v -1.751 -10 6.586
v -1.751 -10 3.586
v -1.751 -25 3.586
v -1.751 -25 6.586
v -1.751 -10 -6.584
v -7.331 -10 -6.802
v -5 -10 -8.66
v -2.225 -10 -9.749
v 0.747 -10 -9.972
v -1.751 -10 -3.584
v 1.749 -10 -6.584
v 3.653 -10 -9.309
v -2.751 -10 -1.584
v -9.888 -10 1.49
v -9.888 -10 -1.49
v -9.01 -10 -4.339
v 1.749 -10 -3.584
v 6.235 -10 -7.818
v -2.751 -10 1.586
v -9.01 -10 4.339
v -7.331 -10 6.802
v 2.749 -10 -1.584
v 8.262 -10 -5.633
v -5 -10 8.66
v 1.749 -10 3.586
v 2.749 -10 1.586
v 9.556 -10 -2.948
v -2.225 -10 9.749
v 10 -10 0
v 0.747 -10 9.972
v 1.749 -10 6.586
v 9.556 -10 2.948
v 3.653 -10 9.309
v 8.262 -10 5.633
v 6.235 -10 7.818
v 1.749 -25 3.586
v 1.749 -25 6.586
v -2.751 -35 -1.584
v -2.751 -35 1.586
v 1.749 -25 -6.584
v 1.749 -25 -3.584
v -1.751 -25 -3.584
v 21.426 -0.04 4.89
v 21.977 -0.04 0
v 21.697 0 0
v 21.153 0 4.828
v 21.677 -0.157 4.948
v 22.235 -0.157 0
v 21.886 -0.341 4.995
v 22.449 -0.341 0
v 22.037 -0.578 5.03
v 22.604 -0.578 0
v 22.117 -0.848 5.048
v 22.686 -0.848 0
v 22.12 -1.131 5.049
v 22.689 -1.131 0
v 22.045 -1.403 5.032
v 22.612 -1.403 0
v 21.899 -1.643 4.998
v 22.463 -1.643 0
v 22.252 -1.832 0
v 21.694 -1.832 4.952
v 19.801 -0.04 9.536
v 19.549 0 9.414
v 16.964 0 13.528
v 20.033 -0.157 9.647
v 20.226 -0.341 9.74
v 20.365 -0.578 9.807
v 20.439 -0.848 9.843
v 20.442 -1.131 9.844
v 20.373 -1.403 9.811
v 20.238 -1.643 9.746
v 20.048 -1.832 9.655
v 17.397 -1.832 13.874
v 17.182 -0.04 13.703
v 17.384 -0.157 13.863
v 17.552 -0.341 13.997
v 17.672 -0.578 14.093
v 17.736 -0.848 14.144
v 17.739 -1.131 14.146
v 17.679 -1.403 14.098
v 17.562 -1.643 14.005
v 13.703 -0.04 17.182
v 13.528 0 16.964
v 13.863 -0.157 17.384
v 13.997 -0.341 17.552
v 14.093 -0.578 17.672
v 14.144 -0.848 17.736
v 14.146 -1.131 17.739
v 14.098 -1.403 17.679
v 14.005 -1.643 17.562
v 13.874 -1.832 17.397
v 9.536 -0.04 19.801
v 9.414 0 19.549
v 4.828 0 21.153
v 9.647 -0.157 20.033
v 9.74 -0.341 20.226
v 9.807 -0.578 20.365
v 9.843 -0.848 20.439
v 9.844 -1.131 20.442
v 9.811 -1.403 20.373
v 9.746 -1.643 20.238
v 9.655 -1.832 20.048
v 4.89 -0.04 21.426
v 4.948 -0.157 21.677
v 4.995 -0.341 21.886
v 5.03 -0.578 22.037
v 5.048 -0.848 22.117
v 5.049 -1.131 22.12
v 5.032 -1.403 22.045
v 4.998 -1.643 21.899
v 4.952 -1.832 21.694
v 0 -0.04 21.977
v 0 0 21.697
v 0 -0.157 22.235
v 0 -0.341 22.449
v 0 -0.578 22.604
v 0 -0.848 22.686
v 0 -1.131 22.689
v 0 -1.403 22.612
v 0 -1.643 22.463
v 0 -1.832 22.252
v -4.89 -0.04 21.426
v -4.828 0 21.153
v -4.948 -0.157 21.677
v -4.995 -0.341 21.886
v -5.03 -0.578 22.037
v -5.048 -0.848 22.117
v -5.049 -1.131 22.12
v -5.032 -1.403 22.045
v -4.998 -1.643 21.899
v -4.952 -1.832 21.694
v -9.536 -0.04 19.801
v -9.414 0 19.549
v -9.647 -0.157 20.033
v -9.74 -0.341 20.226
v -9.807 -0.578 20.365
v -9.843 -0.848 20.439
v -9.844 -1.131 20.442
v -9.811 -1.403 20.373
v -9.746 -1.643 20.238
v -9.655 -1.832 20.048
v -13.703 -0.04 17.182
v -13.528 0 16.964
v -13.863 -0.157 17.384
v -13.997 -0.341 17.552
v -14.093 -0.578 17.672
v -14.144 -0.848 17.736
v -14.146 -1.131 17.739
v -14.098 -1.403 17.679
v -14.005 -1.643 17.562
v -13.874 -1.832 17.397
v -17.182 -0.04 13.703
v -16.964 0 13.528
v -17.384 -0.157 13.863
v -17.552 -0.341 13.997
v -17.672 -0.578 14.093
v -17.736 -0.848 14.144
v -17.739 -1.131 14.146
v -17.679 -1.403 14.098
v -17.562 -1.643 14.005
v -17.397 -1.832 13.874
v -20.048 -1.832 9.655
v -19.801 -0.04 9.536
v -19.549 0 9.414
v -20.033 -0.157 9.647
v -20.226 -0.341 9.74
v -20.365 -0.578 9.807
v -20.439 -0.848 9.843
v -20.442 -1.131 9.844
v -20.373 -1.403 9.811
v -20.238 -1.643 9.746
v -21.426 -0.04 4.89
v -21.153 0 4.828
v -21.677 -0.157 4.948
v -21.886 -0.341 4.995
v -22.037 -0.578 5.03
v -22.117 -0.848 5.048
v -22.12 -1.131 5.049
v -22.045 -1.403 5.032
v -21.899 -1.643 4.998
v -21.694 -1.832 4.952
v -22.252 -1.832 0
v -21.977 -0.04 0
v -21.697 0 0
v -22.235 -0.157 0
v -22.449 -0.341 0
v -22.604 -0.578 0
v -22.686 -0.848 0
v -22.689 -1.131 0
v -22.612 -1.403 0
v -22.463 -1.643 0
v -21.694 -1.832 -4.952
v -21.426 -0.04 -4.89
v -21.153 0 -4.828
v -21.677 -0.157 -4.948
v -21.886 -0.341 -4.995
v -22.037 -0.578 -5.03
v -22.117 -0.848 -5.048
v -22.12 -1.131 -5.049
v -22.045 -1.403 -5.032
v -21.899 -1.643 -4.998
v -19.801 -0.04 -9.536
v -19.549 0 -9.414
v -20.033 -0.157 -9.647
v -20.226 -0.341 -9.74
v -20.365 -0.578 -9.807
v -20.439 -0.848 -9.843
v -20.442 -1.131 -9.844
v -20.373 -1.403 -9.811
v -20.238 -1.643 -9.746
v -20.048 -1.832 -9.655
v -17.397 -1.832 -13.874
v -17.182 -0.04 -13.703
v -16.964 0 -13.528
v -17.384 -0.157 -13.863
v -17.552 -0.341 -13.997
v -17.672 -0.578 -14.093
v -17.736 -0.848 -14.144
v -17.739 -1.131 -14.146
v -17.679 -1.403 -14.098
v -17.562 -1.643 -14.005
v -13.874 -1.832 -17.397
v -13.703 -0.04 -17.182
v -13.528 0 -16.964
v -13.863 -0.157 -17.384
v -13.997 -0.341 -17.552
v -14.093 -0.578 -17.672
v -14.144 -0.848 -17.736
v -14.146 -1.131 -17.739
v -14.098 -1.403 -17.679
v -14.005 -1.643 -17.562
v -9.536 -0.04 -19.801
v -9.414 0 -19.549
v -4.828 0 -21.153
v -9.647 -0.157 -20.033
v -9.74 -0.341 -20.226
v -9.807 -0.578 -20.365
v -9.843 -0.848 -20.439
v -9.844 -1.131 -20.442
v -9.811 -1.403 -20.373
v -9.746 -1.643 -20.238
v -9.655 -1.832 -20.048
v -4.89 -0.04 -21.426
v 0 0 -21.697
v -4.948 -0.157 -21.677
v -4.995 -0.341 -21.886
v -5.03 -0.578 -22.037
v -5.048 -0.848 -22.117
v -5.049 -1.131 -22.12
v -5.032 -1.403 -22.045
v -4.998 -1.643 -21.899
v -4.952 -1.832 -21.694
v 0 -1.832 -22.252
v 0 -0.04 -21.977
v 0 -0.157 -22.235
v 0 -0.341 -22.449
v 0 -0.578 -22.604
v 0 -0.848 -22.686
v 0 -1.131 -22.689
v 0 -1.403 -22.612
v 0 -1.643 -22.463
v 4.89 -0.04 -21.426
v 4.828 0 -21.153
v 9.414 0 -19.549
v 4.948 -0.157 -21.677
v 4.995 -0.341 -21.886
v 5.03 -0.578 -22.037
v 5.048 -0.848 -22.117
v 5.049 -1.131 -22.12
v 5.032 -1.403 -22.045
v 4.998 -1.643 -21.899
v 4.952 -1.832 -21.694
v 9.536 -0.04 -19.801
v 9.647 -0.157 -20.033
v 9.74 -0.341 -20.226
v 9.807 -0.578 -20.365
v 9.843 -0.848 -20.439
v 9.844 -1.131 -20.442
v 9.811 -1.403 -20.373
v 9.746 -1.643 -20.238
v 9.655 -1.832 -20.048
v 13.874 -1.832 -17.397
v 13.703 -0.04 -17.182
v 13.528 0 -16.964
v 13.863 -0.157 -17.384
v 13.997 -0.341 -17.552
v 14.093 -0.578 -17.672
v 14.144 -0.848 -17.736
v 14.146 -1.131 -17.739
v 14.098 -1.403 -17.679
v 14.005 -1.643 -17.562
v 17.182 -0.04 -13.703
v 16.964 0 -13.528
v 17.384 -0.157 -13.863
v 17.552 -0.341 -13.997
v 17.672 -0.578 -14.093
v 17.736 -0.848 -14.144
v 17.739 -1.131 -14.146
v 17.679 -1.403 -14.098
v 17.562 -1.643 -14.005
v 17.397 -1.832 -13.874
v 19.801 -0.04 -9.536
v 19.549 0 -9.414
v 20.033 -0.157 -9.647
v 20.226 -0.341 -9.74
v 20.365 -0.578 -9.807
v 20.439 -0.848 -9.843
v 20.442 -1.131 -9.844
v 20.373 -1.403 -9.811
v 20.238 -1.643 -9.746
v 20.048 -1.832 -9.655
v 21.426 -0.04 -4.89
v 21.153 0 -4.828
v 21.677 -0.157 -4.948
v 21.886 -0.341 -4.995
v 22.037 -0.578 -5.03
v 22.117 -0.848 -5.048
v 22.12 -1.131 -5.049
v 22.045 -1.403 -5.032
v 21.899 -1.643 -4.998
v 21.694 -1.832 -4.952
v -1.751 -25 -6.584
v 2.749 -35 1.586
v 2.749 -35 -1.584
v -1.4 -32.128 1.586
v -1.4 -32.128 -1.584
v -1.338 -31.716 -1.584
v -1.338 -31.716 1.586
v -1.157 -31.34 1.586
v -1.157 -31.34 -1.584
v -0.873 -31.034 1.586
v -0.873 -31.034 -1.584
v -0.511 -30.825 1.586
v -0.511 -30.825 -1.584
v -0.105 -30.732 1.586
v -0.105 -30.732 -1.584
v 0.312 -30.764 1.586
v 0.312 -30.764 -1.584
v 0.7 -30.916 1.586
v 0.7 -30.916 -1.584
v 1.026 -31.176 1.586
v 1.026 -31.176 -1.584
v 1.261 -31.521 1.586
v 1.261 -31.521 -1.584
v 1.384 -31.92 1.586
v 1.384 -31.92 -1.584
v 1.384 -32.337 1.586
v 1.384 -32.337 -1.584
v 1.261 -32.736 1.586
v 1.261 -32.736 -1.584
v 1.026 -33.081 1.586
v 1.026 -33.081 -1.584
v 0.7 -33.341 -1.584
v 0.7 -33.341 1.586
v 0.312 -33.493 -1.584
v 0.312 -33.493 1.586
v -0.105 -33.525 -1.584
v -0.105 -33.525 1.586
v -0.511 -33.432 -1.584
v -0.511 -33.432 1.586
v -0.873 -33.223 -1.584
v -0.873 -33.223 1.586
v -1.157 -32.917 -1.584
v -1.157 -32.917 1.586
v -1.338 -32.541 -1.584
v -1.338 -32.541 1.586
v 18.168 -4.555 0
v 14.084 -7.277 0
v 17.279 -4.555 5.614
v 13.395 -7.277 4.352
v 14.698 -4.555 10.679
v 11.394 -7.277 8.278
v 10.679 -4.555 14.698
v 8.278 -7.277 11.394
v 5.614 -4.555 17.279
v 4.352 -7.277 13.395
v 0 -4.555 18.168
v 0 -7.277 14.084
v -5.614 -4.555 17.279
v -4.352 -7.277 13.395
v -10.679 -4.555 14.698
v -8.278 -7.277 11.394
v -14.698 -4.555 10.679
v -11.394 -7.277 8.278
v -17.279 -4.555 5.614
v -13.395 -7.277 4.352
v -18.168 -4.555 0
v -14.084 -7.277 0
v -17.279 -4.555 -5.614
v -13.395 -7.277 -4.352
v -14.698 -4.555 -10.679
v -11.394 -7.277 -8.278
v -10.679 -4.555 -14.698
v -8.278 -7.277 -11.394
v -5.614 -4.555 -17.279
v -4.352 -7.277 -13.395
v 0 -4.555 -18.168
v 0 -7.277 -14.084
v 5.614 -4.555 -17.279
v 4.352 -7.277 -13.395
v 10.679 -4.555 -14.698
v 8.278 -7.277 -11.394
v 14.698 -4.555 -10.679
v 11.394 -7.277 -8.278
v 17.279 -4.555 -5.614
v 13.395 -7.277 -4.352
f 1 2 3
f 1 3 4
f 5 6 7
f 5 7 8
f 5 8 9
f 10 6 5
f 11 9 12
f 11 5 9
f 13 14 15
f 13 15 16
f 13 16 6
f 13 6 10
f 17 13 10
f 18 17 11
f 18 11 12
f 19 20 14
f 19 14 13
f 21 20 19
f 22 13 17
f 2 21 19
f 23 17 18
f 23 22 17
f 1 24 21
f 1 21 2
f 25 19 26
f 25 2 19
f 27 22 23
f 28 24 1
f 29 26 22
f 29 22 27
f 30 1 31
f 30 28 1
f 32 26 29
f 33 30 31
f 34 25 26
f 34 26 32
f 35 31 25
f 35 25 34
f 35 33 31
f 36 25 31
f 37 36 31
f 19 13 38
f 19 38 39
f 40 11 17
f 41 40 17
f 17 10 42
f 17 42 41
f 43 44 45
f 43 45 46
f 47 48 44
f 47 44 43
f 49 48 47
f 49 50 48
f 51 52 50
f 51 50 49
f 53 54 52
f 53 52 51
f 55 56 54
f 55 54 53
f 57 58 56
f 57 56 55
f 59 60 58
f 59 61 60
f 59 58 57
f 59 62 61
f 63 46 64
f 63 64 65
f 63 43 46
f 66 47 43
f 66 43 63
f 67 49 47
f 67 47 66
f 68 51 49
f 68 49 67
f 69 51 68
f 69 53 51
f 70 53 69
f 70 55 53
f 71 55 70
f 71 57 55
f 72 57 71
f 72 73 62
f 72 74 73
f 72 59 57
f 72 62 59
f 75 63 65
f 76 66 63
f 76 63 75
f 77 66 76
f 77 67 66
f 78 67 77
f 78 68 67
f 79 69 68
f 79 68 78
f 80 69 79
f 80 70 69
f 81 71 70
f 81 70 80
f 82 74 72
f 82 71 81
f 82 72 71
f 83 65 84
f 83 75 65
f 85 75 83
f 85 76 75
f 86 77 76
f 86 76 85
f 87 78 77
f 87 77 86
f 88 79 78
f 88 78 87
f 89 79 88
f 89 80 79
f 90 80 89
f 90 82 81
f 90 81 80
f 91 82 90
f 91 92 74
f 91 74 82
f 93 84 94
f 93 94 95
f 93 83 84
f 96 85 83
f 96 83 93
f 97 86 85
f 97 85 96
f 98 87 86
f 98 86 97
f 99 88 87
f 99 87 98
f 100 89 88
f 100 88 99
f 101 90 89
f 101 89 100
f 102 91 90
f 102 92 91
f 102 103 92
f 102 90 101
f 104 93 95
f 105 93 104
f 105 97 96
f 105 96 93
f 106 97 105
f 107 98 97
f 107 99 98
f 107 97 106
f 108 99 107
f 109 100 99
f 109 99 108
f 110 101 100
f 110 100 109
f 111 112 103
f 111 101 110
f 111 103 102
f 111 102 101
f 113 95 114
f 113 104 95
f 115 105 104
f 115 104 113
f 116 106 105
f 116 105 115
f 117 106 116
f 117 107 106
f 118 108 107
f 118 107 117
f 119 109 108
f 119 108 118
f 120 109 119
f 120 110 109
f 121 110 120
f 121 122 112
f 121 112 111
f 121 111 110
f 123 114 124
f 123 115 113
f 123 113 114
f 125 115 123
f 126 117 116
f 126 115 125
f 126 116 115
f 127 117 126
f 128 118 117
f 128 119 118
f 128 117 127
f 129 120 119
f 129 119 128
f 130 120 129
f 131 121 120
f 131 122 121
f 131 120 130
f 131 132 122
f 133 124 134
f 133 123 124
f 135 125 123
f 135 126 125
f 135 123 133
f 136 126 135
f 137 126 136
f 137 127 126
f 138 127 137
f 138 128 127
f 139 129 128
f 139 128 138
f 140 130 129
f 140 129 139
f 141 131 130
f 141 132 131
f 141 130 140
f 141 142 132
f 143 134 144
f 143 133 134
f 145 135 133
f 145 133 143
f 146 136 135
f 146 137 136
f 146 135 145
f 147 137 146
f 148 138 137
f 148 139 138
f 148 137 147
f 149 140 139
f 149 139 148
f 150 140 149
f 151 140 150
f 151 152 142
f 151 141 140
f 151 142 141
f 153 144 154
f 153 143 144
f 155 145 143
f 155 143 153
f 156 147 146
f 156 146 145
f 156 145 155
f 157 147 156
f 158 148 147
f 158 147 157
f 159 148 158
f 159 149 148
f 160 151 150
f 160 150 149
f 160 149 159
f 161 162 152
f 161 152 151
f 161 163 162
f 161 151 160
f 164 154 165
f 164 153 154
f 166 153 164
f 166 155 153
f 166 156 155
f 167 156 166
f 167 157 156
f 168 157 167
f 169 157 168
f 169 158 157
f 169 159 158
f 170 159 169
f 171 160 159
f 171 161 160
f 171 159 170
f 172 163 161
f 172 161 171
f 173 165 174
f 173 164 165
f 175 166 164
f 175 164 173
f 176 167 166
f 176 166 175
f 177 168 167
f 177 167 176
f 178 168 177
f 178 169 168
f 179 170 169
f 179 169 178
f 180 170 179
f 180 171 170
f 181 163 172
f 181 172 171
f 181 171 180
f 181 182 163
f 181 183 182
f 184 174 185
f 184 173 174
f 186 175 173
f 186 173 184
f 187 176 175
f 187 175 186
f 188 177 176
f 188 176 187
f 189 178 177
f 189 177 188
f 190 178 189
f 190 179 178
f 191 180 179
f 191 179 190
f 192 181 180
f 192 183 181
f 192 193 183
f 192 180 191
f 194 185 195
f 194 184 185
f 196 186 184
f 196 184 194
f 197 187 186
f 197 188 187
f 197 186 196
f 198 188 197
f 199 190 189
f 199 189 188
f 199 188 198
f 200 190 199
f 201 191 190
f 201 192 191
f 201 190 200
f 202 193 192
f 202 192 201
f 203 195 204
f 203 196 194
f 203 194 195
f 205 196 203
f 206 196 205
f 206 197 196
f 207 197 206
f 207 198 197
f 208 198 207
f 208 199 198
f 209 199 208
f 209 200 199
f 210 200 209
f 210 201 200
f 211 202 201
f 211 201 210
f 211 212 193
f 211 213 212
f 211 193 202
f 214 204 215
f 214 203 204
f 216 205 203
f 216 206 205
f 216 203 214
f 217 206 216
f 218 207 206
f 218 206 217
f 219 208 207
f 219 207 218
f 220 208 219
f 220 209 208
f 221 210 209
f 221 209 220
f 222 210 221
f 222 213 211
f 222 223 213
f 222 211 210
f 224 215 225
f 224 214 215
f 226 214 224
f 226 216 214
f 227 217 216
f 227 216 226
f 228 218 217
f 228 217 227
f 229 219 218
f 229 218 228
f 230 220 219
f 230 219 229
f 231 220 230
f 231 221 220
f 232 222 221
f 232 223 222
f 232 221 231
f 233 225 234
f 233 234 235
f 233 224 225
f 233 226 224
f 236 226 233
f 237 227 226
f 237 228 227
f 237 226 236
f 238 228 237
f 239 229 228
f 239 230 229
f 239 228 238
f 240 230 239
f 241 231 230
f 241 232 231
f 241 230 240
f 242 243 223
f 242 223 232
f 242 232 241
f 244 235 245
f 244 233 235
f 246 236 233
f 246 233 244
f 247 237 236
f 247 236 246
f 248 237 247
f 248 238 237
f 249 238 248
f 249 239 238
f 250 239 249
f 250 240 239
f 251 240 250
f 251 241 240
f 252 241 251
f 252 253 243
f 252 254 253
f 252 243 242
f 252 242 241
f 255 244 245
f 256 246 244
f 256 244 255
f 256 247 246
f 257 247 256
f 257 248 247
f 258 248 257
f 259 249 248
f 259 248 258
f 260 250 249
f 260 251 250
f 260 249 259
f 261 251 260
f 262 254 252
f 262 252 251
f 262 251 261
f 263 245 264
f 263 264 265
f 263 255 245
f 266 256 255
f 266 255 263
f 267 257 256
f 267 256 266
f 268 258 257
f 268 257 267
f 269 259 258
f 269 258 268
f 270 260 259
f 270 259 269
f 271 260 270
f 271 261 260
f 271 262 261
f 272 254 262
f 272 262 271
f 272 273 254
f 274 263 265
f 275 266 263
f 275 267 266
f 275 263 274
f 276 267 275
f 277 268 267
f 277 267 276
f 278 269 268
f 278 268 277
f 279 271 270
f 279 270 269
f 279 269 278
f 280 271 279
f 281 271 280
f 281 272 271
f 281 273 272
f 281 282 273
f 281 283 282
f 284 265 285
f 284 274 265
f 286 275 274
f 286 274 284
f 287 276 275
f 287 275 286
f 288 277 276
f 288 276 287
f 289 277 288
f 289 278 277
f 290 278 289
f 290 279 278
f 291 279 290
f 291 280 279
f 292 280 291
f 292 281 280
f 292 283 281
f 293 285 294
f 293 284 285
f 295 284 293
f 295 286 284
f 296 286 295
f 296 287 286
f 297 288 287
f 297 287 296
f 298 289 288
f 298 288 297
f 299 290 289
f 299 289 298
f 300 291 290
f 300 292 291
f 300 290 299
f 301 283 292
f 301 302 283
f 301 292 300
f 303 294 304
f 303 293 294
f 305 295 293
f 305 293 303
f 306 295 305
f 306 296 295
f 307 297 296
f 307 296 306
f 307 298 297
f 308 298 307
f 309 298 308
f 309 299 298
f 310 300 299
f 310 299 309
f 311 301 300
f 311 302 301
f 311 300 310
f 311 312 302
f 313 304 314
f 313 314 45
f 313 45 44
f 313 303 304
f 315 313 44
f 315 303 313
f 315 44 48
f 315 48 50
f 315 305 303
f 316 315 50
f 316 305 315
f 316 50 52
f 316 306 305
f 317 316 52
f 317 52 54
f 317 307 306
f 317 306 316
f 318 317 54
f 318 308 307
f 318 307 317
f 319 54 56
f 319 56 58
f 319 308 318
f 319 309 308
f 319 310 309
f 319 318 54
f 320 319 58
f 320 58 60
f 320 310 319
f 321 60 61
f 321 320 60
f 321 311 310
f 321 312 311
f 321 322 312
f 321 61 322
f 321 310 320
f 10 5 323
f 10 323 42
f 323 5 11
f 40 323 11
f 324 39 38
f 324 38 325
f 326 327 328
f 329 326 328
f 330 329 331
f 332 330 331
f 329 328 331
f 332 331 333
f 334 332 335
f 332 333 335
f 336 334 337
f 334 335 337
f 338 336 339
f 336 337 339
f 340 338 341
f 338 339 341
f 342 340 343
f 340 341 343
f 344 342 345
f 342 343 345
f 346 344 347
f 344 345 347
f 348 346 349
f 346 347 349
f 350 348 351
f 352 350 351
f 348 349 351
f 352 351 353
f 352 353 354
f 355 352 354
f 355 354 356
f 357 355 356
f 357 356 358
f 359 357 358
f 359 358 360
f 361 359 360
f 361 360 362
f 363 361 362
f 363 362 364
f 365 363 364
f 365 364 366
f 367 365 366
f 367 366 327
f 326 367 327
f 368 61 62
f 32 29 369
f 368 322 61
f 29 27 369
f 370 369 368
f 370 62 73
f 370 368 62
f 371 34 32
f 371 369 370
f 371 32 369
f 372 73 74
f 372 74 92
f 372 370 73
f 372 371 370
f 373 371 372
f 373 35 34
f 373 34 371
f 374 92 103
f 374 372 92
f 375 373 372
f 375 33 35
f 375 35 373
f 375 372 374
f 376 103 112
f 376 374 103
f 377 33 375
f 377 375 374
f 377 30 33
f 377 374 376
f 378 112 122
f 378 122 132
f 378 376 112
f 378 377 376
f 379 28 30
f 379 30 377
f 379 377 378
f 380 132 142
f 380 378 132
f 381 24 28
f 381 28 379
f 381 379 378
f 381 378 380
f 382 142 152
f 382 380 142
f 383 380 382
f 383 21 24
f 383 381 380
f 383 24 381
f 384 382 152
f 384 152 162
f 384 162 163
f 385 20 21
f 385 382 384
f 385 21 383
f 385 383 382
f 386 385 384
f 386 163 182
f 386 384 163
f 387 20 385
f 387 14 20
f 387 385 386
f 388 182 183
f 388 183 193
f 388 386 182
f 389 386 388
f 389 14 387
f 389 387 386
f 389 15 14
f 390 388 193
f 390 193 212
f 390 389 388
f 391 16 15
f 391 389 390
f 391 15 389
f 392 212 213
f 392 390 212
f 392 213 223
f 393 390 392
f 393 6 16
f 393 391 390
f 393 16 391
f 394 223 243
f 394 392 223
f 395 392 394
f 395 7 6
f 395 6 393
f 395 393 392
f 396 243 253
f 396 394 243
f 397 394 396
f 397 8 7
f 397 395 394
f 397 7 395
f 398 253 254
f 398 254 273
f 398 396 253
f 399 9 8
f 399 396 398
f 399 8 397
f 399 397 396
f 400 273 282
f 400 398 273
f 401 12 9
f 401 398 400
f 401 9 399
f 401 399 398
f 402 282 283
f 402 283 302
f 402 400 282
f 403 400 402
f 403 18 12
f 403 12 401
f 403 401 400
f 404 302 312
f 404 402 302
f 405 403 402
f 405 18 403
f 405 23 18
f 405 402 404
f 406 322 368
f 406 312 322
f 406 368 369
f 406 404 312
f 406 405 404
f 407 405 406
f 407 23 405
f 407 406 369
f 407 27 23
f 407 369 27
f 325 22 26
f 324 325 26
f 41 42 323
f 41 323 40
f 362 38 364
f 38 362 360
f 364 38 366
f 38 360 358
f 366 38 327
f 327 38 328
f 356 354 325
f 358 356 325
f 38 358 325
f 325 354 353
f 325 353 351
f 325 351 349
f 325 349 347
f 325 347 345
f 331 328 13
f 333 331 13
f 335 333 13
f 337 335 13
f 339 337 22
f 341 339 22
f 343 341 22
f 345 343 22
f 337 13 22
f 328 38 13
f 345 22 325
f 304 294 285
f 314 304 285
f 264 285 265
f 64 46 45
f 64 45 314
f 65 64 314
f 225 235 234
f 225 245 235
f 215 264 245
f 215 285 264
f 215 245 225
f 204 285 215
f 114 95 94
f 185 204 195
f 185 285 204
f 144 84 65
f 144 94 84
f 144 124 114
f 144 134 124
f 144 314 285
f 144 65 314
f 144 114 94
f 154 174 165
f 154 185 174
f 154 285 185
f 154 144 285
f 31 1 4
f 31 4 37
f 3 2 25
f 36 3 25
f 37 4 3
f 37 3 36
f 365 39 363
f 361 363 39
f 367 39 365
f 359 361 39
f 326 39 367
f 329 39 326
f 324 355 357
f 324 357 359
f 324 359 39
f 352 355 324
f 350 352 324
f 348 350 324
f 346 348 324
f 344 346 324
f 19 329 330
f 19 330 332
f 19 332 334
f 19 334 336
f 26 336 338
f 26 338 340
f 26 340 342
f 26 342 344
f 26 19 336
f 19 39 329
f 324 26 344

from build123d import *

# Parameters (mm, degrees)
SKETCH2_W           = 5.5
SKETCH2_H           = 3.17
BOSS_EXTRUDE1_DEPTH = 25
SKETCH3_R           = 1.4
CUT_EXTRUDE1_DEPTH  = 27.583939305
SKETCH6_W           = 3.5
SKETCH6_H           = 3
BOSS_EXTRUDE2_DEPTH = 15
FILLET2_R           = 1


with BuildPart() as part:
    # Sketch1 → Revolve1 (revolve)
    with BuildSketch(Plane.XY):
        Polygon((0, 0), (25, 0), (10, -10), (0, -10), align=None)
    revolve(axis=Axis((0, 0, 0), (0, -1, 0)))

    # Sketch2 → Boss-Extrude1 (add)
    with BuildSketch(Plane.XZ.offset(10)):
        with Locations((-0.00136169, 0.001060695)):
            Rectangle(SKETCH2_W, SKETCH2_H)
    extrude(amount=BOSS_EXTRUDE1_DEPTH)

    # Sketch3 → Cut-Extrude1 (cut, through all)
    with BuildSketch(Plane(origin=(0, 0, -1.583939305), x_dir=(-1, 0, 0), z_dir=(0, 0, -1))):
        with Locations((0, -32.128448622)):
            Circle(SKETCH3_R)
    extrude(amount=-CUT_EXTRUDE1_DEPTH, mode=Mode.SUBTRACT)

    # Sketch6 → Boss-Extrude2 (add)
    with BuildSketch(Plane.XZ.offset(10)):
        with Locations((-0.00136169, -5.083939305)):
            Rectangle(SKETCH6_W, SKETCH6_H)
        with Locations((-0.00136169, 5.086060695)):
            Rectangle(SKETCH6_W, SKETCH6_H)
    extrude(amount=BOSS_EXTRUDE2_DEPTH)

    # Fillet2
    fillet2_edges = [part.edges().sort_by_distance(p)[0] for p in [
        (-25, 0, 0),
    ]]
    fillet(fillet2_edges, radius=FILLET2_R)


solid = part.part
